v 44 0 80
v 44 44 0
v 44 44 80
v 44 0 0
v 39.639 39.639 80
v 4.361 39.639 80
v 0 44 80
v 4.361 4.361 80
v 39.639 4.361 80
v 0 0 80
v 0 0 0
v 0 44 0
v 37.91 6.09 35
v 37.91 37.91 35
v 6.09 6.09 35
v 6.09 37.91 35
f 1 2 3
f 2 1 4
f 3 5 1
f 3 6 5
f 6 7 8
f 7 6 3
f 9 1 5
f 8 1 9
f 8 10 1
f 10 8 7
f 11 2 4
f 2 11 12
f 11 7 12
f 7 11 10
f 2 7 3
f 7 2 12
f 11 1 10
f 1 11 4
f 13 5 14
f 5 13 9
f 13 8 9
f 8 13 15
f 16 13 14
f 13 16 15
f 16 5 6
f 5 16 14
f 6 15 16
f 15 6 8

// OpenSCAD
difference() {
   cube([44,44,80], center=false);
   translate(v=[22,22,35]) {
       rotate([0,0,45]) {
           cylinder(h=46, r1=22.5, r2=25, $fn=4);
       }
   }
}
